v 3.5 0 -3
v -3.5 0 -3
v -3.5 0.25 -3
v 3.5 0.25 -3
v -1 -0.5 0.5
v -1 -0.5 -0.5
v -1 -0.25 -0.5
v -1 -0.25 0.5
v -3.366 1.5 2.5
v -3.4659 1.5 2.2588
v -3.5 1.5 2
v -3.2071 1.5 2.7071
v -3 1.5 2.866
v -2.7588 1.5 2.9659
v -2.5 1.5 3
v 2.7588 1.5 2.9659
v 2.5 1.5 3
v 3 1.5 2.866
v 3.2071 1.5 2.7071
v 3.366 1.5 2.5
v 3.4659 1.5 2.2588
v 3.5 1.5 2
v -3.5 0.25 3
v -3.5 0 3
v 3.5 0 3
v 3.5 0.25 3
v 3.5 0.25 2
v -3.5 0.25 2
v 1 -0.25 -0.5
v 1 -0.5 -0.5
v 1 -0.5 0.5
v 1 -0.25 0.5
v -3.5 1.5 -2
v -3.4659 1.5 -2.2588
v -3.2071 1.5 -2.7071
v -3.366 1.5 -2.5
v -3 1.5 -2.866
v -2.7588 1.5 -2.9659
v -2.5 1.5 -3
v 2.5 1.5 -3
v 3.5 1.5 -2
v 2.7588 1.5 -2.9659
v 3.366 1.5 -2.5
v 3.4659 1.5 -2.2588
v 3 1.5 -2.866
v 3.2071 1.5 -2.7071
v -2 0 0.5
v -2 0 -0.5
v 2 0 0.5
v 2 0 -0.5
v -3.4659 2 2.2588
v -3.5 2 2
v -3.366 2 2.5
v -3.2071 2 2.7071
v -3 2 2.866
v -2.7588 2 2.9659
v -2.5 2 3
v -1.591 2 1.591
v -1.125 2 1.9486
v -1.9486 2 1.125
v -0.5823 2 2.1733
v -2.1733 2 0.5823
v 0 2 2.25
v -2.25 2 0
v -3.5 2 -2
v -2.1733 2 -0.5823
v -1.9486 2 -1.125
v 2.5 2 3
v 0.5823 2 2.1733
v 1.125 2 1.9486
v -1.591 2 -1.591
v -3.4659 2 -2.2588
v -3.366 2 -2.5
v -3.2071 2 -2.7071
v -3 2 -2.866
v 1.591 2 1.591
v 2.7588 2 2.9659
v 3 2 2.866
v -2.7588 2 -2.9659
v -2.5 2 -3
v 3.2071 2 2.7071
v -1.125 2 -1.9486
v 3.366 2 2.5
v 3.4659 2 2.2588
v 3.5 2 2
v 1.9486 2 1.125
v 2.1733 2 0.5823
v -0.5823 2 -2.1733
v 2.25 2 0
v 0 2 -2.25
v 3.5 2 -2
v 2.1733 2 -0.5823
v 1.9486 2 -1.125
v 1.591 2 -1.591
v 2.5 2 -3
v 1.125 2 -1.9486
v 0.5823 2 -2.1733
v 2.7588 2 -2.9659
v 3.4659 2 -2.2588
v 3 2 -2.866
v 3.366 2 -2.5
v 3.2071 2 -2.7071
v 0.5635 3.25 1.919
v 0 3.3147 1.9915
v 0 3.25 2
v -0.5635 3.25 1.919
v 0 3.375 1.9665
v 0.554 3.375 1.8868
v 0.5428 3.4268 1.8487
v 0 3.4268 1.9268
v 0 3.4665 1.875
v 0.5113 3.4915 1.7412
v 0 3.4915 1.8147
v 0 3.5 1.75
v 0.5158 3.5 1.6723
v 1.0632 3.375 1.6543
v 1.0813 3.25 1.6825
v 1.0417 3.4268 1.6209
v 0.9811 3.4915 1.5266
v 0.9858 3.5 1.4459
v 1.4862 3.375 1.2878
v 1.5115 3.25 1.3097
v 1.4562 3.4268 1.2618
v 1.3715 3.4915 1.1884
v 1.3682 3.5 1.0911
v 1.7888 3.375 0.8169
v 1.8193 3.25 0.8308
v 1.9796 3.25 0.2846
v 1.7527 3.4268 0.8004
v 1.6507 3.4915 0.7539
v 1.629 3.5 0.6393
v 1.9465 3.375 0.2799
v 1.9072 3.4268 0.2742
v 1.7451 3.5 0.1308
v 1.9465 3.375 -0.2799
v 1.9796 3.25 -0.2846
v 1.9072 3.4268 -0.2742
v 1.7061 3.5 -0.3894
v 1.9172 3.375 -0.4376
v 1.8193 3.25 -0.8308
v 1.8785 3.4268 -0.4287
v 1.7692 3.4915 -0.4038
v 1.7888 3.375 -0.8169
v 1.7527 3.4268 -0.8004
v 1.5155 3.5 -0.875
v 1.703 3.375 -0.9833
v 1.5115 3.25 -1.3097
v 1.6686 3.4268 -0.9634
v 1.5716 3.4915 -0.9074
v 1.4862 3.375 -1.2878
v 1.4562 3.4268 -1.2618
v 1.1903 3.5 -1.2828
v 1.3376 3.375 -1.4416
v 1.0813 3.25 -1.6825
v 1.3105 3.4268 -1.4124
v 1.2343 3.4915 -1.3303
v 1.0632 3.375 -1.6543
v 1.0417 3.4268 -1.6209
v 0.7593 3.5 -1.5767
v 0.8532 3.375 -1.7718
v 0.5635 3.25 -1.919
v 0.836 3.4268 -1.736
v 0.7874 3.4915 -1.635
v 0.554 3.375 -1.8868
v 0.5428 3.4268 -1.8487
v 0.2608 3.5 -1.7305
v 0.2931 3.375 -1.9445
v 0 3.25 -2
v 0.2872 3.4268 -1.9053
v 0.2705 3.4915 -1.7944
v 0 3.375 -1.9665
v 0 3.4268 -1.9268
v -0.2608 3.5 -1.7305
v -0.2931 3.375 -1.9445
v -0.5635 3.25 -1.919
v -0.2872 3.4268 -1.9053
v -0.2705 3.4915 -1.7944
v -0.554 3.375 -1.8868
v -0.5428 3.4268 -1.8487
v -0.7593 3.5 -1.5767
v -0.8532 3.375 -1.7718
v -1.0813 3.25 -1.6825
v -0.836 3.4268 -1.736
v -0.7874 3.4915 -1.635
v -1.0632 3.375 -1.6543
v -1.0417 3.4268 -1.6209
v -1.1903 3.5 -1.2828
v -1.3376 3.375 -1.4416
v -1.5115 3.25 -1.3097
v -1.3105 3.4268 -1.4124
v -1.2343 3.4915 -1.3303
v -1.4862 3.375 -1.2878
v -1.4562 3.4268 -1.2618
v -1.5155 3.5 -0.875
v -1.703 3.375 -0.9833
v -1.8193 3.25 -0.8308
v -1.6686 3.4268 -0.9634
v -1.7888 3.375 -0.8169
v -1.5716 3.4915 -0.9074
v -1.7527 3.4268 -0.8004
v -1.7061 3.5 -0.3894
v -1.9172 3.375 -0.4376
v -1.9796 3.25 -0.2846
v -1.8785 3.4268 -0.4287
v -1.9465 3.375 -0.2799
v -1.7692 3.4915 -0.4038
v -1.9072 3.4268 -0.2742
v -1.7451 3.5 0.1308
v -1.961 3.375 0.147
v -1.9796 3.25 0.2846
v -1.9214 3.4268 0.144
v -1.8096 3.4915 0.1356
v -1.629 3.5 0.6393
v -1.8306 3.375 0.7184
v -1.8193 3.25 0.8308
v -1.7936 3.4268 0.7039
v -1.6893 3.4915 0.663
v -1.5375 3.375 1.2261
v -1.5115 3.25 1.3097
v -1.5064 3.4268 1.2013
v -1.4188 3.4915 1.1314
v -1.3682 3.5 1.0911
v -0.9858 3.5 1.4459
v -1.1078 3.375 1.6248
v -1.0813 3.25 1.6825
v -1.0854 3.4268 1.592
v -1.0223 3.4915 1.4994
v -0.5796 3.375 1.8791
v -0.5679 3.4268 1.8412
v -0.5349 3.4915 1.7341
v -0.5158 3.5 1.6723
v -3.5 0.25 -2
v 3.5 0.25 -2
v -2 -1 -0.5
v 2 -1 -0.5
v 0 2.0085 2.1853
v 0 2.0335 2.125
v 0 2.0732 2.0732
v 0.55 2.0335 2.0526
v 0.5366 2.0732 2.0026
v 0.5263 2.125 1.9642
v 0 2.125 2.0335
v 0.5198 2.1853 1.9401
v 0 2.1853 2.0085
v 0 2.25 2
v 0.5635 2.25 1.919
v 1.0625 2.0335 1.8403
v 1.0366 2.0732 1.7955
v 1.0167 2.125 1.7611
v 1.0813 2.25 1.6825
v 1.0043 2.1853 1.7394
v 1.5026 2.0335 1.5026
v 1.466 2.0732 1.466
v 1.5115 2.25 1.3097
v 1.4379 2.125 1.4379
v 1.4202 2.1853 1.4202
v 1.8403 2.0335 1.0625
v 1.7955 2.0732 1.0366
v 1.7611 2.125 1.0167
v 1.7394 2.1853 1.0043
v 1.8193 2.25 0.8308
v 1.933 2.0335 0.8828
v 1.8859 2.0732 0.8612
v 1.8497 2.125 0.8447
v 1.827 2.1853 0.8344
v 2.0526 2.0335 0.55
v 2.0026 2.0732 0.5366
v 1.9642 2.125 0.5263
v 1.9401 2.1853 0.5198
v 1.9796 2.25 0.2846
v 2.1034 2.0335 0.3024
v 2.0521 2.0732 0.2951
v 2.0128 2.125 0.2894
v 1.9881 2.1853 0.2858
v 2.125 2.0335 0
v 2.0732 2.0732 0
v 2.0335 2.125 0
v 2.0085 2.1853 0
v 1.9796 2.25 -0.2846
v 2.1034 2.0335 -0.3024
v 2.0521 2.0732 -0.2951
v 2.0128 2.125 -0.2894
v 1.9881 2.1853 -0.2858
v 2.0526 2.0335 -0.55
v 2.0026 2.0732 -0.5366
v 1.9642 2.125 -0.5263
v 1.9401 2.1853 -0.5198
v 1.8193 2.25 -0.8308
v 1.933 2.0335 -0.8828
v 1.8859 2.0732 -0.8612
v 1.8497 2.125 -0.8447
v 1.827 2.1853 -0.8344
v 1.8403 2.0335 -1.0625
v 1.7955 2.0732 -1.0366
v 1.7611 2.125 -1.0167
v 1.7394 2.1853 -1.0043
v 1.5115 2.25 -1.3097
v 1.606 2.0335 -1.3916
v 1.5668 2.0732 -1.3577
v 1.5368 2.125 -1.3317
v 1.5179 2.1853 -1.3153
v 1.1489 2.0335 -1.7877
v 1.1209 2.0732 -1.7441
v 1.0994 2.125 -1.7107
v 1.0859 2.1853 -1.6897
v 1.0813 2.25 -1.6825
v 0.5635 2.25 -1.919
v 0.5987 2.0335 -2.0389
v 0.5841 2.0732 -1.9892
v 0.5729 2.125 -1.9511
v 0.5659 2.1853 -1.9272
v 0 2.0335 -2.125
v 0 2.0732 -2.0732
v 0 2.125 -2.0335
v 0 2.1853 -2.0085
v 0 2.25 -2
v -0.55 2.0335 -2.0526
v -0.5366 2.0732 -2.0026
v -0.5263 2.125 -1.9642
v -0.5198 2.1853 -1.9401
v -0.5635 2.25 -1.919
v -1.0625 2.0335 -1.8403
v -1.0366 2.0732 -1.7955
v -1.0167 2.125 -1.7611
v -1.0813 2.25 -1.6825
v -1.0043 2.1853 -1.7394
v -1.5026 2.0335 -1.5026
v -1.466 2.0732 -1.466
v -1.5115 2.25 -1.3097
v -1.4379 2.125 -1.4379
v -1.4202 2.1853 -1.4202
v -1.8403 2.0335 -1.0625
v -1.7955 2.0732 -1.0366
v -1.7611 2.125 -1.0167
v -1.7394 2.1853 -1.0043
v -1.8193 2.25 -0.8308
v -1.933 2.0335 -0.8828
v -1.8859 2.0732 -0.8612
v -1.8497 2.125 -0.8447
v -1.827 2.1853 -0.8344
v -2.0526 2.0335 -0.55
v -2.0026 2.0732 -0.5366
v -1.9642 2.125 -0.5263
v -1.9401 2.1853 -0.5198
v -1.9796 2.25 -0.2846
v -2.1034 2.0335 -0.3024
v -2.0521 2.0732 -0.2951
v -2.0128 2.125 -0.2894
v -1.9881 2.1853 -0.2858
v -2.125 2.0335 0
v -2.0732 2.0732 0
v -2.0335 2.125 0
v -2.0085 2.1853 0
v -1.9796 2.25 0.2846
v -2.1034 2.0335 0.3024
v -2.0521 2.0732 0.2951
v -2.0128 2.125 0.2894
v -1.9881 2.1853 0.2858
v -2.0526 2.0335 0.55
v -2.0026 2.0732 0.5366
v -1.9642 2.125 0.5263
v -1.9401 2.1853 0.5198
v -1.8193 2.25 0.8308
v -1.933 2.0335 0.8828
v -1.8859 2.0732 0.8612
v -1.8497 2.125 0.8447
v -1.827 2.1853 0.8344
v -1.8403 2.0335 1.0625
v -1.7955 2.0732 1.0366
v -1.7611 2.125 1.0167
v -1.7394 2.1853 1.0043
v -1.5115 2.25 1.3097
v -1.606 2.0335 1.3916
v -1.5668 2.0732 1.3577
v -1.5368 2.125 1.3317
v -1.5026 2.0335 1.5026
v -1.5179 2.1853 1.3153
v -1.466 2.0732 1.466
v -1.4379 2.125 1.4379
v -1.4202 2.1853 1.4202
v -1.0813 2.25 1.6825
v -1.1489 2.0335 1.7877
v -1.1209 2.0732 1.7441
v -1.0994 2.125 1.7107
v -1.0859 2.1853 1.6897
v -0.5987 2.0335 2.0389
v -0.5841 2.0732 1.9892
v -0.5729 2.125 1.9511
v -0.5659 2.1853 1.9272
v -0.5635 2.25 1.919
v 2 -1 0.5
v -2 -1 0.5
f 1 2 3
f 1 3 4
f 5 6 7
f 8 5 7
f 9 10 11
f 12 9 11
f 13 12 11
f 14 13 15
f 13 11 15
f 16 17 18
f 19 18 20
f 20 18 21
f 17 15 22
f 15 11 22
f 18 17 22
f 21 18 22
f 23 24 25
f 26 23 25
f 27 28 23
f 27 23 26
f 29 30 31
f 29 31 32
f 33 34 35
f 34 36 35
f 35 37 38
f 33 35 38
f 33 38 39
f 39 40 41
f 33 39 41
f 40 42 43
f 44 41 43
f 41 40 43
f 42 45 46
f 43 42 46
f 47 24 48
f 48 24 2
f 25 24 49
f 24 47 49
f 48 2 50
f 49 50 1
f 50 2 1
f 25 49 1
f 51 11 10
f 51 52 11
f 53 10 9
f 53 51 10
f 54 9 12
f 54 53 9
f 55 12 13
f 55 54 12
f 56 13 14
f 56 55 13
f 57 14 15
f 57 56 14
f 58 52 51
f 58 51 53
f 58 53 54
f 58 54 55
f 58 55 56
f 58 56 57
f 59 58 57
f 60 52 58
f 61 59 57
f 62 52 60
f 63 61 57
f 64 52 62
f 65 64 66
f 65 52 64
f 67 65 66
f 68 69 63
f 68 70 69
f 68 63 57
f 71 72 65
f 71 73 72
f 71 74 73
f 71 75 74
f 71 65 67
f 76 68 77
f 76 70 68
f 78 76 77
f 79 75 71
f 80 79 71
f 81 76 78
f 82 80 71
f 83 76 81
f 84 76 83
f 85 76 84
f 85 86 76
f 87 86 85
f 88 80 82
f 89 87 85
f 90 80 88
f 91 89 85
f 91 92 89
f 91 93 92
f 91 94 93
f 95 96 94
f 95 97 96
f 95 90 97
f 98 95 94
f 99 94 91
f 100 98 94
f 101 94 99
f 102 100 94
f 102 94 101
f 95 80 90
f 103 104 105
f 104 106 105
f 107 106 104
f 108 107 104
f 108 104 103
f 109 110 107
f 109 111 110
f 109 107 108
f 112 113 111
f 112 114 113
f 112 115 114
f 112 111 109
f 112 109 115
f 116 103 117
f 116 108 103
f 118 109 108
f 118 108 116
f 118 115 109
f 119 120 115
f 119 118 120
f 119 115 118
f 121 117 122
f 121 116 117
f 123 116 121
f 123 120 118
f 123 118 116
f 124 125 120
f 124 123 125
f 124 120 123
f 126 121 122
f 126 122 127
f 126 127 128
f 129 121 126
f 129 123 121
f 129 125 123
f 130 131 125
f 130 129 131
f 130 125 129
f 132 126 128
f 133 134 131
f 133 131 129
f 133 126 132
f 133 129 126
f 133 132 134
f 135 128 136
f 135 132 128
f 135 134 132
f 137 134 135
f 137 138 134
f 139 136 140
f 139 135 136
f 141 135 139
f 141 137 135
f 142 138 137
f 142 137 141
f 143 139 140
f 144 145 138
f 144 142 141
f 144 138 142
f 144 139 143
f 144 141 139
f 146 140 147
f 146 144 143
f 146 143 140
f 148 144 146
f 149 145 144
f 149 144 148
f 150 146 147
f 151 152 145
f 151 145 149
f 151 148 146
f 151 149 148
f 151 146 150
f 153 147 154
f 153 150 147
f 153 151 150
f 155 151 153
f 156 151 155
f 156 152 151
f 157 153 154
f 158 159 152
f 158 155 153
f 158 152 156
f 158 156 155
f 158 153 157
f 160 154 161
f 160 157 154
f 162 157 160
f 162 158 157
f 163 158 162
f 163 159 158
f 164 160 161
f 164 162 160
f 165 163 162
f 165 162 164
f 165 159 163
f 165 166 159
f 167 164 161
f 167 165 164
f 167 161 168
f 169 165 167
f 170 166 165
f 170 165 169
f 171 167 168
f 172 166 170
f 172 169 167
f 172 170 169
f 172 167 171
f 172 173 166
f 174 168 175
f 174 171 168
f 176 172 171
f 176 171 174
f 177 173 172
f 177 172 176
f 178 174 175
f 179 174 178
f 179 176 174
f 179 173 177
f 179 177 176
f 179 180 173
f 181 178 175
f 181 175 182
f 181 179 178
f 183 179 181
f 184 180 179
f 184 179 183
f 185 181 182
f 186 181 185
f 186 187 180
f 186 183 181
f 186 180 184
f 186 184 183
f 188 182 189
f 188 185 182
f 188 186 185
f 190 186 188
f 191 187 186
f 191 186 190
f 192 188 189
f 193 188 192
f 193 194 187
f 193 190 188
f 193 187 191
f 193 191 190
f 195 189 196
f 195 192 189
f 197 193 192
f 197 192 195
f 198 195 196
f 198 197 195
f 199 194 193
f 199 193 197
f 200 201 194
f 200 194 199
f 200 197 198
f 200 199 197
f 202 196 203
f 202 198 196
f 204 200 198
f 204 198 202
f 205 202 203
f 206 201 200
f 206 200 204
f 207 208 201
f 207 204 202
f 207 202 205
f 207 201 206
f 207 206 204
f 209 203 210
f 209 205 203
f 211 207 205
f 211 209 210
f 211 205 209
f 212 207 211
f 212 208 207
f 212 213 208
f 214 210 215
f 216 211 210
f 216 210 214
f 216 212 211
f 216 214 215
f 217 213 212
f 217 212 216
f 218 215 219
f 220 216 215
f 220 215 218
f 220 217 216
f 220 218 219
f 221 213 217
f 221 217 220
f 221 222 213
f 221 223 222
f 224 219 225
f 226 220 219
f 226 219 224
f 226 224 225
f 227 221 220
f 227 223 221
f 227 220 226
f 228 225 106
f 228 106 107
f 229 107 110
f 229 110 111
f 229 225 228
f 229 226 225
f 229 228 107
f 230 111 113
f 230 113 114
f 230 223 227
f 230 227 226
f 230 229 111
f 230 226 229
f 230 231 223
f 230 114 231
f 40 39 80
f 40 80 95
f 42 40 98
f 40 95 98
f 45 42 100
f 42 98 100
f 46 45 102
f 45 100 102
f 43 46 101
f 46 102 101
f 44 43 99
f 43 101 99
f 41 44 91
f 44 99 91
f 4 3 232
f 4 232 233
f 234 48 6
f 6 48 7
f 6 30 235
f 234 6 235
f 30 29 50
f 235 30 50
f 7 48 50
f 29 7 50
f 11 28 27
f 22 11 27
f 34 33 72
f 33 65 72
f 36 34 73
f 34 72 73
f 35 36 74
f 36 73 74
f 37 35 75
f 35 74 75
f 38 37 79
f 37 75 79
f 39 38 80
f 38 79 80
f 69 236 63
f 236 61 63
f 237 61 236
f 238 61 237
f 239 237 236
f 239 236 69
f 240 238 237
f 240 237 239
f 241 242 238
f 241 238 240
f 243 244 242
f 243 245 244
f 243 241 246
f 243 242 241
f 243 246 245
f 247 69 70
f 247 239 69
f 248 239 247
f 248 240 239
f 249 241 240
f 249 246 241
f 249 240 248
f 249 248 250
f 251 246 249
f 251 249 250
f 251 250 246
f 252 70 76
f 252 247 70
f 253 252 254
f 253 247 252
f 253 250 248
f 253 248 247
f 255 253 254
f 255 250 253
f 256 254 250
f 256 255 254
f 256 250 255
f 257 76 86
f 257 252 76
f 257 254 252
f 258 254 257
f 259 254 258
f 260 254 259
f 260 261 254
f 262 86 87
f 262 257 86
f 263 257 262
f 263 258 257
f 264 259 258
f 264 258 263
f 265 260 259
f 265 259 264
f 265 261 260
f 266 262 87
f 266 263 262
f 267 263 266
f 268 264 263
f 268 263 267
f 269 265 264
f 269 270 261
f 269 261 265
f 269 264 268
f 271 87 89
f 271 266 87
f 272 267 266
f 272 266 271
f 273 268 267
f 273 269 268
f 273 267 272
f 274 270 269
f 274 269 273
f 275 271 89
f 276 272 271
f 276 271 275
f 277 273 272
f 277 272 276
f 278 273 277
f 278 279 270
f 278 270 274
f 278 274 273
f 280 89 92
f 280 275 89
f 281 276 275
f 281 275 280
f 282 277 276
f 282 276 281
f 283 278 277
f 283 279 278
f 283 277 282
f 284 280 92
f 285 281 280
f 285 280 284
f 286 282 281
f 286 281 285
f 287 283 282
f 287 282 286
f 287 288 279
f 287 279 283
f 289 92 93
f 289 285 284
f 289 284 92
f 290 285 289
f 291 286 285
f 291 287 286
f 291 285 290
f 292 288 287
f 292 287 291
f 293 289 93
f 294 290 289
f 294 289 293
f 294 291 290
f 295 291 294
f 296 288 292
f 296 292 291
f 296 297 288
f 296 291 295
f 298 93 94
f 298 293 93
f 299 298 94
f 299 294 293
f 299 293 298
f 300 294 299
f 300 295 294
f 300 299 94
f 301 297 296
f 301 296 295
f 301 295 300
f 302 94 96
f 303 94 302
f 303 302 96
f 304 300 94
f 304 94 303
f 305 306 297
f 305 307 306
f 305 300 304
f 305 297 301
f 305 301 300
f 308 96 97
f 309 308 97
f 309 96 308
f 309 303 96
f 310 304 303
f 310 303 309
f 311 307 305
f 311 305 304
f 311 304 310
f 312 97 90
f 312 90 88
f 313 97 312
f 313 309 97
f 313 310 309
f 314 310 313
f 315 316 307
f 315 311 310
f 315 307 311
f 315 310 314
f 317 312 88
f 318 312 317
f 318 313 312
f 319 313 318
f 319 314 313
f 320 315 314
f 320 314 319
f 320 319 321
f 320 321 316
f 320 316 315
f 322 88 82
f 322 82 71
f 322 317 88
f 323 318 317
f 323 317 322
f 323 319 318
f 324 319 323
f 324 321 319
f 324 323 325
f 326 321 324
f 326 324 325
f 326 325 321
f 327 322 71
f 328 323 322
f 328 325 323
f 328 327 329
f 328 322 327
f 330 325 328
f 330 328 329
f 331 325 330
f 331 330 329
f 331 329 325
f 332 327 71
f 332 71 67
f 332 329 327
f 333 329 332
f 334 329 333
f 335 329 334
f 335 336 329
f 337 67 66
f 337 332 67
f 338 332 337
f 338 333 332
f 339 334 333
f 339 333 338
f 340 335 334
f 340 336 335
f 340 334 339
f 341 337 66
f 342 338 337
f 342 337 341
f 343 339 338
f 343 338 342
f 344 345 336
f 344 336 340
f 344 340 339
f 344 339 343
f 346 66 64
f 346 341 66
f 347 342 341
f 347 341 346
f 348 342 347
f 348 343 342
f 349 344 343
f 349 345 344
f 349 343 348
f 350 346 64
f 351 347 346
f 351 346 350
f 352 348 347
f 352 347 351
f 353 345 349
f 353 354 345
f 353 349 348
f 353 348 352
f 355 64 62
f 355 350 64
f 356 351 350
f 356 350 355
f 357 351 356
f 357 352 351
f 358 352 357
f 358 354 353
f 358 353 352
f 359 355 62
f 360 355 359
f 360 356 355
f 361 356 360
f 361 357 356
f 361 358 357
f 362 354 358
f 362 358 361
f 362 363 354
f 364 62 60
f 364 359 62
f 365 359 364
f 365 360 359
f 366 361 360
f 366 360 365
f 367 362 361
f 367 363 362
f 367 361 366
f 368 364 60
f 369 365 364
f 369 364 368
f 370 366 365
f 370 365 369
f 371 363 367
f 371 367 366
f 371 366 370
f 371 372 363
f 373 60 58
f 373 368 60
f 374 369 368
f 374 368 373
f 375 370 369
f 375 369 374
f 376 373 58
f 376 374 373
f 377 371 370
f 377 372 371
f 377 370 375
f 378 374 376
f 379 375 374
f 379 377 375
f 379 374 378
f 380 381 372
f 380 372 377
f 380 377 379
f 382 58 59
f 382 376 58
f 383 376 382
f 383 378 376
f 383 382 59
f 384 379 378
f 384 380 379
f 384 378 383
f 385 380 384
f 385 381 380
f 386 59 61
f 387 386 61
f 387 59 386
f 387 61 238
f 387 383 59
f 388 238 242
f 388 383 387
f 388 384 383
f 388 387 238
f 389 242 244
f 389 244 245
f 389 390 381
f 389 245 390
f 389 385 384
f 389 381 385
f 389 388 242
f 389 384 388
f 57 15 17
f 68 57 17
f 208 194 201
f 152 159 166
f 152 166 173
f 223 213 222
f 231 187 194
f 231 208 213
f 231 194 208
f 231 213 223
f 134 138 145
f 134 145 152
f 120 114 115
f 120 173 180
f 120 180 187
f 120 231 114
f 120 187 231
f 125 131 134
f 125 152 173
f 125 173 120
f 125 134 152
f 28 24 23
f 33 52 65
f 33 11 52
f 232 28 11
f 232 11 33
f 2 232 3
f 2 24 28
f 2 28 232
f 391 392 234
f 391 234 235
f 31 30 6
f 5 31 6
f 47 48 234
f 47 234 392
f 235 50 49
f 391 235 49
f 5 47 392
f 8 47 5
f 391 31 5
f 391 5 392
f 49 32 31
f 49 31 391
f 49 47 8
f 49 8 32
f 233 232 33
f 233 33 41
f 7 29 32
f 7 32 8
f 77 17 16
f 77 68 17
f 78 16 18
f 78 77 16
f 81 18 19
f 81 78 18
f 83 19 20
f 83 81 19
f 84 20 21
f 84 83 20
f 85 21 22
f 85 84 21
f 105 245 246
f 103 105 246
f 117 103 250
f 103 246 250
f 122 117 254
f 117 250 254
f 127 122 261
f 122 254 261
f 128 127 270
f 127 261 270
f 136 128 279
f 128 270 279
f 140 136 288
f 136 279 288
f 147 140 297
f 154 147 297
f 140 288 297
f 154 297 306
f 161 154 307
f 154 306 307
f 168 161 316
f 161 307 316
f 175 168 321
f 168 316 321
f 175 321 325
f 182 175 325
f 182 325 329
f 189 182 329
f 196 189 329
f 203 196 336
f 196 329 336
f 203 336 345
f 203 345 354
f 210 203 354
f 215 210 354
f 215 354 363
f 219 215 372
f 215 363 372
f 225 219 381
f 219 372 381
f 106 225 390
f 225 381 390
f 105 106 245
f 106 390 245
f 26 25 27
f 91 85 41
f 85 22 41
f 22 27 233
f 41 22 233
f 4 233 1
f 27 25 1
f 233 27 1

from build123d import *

# Parameters (mm, degrees)
SZKIC1_W                    = 7
SZKIC1_H                    = 6
DODANIE_WYCI_GNI_CIE1_DEPTH = 0.25
SZKIC2_W                    = 7
SZKIC2_H                    = 4
DODANIE_WYCI_GNI_CIE2_DEPTH = 1.25
SZKIC3_W                    = 7
SZKIC3_H                    = 6
DODANIE_WYCI_GNI_CIE3_DEPTH = 0.5
SZKIC4_R                    = 2
DODANIE_WYCI_GNI_CIE4_DEPTH = 1.5
ZAOKR_GLENIE1_R             = 0.25
ZAOKR_GLENIE2_R             = 1
SZKIC5_W                    = 4
SZKIC5_H                    = 1
DODANIE_WYCI_GNI_CIE5_DEPTH = 1
SZKIC6_W                    = 2
SZKIC6_H                    = 0.25
WYTNIJ_WYCI_GNI_CIE1_DEPTH  = 1


with BuildPart() as part:
    # Szkic1 → Dodanie-wyciągnięcie1 (new body)
    with BuildSketch(Plane(origin=(0, 0, 0), x_dir=(1, 0, 0), z_dir=(0, 1, 0))):
        Rectangle(SZKIC1_W, SZKIC1_H)
    extrude(amount=DODANIE_WYCI_GNI_CIE1_DEPTH)

    # Szkic2 → Dodanie-wyciągnięcie2 (add)
    with BuildSketch(Plane(origin=(0, 0.25, 0), x_dir=(1, 0, 0), z_dir=(0, 1, 0))):
        Rectangle(SZKIC2_W, SZKIC2_H)
    extrude(amount=DODANIE_WYCI_GNI_CIE2_DEPTH)

    # Szkic3 → Dodanie-wyciągnięcie3 (add)
    with BuildSketch(Plane(origin=(0, 1.5, 0), x_dir=(1, 0, 0), z_dir=(0, 1, 0))):
        Rectangle(SZKIC3_W, SZKIC3_H)
    extrude(amount=DODANIE_WYCI_GNI_CIE3_DEPTH)

    # Szkic4 → Dodanie-wyciągnięcie4 (add)
    with BuildSketch(Plane(origin=(0, 2, 0), x_dir=(1, 0, 0), z_dir=(0, 1, 0))):
        with Locations(Location((0, 0, 0), (0, 0, 270))):
            Circle(SZKIC4_R)
    extrude(amount=DODANIE_WYCI_GNI_CIE4_DEPTH)

    # Zaokrąglenie1
    zaokr_glenie1_edges = [part.edges().sort_by_distance(p)[0] for p in [
        (0, 2, -2),
        (0, 3.5, -2),
    ]]
    fillet(zaokr_glenie1_edges, radius=ZAOKR_GLENIE1_R)

    # Zaokrąglenie2
    zaokr_glenie2_edges = [part.edges().sort_by_distance(p)[0] for p in [
        (-3.5, 1.75, -3),
        (3.5, 1.75, -3),
        (3.5, 1.75, 3),
        (-3.5, 1.75, 3),
    ]]
    fillet(zaokr_glenie2_edges, radius=ZAOKR_GLENIE2_R)

    # Szkic5 → Dodanie-wyciągnięcie5 (add)
    with BuildSketch(Plane.XZ):
        Rectangle(SZKIC5_W, SZKIC5_H)
    extrude(amount=DODANIE_WYCI_GNI_CIE5_DEPTH)

    # Szkic6 → Wytnij-wyciągnięcie1 (cut)
    with BuildSketch(Plane(origin=(0, 0, -0.5), x_dir=(-1, 0, 0), z_dir=(0, 0, -1))):
        with Locations((0, -0.375)):
            Rectangle(SZKIC6_W, SZKIC6_H)
    extrude(amount=-WYTNIJ_WYCI_GNI_CIE1_DEPTH, mode=Mode.SUBTRACT)


solid = part.part
